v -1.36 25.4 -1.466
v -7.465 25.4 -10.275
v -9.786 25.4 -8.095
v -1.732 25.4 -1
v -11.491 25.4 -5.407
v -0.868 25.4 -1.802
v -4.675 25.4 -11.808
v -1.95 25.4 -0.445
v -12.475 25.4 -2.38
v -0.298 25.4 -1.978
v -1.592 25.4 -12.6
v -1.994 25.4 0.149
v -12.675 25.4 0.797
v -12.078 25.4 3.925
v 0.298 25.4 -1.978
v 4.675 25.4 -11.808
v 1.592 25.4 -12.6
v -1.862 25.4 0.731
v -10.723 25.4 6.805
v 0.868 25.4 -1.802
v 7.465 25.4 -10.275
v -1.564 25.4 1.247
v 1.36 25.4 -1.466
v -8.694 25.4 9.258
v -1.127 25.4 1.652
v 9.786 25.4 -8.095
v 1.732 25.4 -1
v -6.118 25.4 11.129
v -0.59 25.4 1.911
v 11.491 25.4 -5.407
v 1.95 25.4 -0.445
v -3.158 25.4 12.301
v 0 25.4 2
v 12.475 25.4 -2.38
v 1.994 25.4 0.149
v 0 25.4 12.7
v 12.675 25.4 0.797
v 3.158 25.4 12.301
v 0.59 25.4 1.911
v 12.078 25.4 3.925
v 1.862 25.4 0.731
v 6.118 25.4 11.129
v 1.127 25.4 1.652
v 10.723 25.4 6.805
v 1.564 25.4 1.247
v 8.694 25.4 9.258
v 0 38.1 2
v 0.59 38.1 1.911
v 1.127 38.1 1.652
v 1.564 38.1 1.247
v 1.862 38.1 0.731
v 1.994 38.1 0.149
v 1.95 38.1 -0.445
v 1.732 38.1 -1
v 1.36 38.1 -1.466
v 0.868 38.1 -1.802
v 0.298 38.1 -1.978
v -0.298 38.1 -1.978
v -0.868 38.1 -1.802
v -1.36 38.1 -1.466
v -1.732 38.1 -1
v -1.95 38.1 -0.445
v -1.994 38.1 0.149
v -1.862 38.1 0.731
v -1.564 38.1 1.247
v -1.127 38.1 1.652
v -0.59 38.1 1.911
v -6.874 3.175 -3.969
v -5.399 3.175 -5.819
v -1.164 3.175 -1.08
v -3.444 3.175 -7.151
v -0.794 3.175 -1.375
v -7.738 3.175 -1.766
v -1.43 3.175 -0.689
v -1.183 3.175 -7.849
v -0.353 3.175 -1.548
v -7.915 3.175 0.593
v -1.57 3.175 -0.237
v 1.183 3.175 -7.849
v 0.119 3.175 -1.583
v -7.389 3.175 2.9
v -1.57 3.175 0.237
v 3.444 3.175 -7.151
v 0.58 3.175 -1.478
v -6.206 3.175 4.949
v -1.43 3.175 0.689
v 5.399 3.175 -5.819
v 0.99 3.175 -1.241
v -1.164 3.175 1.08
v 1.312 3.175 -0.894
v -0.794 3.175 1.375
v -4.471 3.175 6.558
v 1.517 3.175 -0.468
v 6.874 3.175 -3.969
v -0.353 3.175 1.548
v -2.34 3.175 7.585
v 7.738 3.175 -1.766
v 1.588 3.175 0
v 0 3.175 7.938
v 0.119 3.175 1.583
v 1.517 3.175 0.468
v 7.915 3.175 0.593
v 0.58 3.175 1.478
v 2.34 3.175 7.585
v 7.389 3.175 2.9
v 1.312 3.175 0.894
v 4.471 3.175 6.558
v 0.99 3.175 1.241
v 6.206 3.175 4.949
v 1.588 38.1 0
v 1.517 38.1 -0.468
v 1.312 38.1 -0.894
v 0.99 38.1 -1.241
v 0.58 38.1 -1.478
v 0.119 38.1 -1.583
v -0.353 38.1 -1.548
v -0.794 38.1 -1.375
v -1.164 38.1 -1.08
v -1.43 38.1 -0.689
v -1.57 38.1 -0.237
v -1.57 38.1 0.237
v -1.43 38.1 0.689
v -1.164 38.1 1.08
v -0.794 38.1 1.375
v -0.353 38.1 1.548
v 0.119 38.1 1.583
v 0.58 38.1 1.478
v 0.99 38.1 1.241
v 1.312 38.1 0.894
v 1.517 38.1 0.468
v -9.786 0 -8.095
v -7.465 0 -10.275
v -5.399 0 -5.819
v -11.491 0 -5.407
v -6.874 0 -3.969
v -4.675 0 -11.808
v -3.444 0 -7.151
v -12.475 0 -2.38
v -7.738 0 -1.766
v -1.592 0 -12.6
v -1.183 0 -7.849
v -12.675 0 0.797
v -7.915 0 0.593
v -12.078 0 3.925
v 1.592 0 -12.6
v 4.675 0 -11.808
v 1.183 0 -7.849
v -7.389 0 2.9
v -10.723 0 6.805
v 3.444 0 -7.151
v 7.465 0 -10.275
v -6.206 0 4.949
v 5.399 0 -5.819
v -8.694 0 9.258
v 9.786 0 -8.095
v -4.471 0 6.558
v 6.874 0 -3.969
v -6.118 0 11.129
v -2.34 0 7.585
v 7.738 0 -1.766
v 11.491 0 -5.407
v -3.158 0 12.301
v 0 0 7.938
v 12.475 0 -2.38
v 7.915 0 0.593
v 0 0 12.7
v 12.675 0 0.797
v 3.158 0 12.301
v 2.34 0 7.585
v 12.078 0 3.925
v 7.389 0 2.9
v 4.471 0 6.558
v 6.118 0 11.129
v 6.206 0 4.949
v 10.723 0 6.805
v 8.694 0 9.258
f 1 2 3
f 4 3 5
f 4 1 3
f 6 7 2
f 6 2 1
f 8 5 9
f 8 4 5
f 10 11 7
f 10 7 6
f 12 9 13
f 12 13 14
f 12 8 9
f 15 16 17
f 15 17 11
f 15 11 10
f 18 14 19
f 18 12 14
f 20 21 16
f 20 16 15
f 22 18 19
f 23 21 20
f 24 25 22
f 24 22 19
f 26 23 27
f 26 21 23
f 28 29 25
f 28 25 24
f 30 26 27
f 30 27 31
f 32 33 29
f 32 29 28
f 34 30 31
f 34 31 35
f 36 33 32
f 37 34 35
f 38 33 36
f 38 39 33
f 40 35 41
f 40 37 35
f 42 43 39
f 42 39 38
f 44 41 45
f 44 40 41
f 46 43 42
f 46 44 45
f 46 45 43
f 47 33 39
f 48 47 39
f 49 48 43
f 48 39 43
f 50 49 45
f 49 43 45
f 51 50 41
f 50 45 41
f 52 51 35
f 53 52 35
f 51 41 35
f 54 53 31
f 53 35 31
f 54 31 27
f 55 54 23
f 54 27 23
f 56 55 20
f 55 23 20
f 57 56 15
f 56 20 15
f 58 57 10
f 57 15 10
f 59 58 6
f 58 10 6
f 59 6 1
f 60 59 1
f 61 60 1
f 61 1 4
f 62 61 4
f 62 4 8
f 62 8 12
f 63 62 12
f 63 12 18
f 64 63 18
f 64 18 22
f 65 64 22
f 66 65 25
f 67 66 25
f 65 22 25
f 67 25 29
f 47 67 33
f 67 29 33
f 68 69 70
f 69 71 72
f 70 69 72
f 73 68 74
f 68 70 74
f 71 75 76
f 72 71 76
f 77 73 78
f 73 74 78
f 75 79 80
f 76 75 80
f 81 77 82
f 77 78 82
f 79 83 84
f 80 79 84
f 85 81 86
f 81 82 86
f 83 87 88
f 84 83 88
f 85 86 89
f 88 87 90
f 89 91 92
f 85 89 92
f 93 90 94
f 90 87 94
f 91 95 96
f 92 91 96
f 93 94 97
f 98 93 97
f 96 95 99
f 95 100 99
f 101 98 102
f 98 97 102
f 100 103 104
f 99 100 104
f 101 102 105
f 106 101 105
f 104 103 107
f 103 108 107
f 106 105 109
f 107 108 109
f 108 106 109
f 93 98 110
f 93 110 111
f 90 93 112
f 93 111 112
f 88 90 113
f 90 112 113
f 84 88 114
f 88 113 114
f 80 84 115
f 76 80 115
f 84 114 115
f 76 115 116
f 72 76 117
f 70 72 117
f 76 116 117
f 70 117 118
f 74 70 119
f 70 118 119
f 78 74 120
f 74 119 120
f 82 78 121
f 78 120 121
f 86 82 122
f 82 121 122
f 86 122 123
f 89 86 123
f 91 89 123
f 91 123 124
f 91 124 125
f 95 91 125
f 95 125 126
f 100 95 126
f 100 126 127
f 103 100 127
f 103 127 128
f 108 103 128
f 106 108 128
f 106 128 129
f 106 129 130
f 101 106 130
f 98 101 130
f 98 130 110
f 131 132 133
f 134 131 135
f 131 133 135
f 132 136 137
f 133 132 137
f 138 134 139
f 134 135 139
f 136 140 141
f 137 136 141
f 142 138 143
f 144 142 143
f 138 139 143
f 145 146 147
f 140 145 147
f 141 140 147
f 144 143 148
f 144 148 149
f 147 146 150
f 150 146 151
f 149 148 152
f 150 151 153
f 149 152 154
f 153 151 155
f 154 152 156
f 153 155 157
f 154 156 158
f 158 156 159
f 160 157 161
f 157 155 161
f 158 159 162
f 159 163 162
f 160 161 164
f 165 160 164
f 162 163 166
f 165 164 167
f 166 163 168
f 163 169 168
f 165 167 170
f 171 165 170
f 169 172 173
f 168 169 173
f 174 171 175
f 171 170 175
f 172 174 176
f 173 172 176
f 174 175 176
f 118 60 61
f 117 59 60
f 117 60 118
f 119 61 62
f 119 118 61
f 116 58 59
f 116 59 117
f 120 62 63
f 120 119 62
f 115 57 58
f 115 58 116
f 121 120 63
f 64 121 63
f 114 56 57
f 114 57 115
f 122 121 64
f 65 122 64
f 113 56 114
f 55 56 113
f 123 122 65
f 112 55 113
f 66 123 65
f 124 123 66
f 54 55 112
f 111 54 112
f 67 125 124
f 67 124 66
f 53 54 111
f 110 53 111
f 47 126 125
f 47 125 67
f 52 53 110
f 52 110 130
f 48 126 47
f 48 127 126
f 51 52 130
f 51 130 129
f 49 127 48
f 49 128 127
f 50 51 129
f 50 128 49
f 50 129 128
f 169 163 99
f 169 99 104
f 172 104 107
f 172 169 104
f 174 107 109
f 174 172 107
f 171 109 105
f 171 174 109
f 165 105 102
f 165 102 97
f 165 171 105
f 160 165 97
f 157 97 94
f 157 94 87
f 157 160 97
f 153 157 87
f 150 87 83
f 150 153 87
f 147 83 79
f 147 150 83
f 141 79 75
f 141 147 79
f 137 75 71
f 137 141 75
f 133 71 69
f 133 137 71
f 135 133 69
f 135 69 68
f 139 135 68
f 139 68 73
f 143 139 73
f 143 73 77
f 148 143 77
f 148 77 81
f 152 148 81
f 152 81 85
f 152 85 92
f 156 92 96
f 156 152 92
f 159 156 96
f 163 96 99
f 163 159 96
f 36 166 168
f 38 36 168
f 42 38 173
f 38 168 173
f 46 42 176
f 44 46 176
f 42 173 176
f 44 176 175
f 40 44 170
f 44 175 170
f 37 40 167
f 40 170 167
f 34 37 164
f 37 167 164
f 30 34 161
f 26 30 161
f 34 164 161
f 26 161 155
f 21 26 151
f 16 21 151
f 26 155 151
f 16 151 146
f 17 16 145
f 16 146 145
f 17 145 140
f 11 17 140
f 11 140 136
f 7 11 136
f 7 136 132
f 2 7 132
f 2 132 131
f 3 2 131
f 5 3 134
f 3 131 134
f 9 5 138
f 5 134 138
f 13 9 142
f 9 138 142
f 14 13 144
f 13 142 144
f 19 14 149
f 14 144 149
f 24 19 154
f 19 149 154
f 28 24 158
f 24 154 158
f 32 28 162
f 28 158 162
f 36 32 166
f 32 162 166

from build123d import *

# Parameters (mm, degrees)
SKETCH1_R                    = 12.7
BOSS_EXTRUDE1_DEPTH          = 25.4
SKETCH2_R                    = 7.9375
CUT_EXTRUDE1_DEPTH           = 3.175
SKETCH12_R                   = 1.999996
BOSS_EXTRUDE3_DEPTH          = 12.7
F_1_8_0_125_DIAMETER_HOLE1_D = 3.175


with BuildPart() as part:
    # Sketch1 → Boss-Extrude1 (new body)
    with BuildSketch(Plane(origin=(0, 0, 0), x_dir=(1, 0, 0), z_dir=(0, 1, 0))):
        with Locations(Location((0, 0, 0), (0, 0, 270))):
            Circle(SKETCH1_R)
    extrude(amount=BOSS_EXTRUDE1_DEPTH)

    # Sketch2 → Cut-Extrude1 (cut)
    with BuildSketch(Plane(origin=(0, 0, 0), x_dir=(1, 0, 0), z_dir=(0, 1, 0))):
        with Locations(Location((0, 0, 0), (0, 0, 270))):
            Circle(SKETCH2_R)
    extrude(amount=CUT_EXTRUDE1_DEPTH, mode=Mode.SUBTRACT)

    # Sketch12 → Boss-Extrude3 (add)
    with BuildSketch(Plane(origin=(0, 25.4, 0), x_dir=(1, 0, 0), z_dir=(0, 1, 0))):
        with Locations(Location((0, 0, 0), (0, 0, 270))):
            Circle(SKETCH12_R)
    extrude(amount=BOSS_EXTRUDE3_DEPTH)

    # 1/8 (0.125) Diameter Hole1 (through all)
    with Locations(Plane(origin=(0, 3.175, 0), x_dir=(-1, 0, 0), z_dir=(0, -1, 0))):
        with Locations((0, 0)):
            Hole(F_1_8_0_125_DIAMETER_HOLE1_D / 2)


solid = part.part
